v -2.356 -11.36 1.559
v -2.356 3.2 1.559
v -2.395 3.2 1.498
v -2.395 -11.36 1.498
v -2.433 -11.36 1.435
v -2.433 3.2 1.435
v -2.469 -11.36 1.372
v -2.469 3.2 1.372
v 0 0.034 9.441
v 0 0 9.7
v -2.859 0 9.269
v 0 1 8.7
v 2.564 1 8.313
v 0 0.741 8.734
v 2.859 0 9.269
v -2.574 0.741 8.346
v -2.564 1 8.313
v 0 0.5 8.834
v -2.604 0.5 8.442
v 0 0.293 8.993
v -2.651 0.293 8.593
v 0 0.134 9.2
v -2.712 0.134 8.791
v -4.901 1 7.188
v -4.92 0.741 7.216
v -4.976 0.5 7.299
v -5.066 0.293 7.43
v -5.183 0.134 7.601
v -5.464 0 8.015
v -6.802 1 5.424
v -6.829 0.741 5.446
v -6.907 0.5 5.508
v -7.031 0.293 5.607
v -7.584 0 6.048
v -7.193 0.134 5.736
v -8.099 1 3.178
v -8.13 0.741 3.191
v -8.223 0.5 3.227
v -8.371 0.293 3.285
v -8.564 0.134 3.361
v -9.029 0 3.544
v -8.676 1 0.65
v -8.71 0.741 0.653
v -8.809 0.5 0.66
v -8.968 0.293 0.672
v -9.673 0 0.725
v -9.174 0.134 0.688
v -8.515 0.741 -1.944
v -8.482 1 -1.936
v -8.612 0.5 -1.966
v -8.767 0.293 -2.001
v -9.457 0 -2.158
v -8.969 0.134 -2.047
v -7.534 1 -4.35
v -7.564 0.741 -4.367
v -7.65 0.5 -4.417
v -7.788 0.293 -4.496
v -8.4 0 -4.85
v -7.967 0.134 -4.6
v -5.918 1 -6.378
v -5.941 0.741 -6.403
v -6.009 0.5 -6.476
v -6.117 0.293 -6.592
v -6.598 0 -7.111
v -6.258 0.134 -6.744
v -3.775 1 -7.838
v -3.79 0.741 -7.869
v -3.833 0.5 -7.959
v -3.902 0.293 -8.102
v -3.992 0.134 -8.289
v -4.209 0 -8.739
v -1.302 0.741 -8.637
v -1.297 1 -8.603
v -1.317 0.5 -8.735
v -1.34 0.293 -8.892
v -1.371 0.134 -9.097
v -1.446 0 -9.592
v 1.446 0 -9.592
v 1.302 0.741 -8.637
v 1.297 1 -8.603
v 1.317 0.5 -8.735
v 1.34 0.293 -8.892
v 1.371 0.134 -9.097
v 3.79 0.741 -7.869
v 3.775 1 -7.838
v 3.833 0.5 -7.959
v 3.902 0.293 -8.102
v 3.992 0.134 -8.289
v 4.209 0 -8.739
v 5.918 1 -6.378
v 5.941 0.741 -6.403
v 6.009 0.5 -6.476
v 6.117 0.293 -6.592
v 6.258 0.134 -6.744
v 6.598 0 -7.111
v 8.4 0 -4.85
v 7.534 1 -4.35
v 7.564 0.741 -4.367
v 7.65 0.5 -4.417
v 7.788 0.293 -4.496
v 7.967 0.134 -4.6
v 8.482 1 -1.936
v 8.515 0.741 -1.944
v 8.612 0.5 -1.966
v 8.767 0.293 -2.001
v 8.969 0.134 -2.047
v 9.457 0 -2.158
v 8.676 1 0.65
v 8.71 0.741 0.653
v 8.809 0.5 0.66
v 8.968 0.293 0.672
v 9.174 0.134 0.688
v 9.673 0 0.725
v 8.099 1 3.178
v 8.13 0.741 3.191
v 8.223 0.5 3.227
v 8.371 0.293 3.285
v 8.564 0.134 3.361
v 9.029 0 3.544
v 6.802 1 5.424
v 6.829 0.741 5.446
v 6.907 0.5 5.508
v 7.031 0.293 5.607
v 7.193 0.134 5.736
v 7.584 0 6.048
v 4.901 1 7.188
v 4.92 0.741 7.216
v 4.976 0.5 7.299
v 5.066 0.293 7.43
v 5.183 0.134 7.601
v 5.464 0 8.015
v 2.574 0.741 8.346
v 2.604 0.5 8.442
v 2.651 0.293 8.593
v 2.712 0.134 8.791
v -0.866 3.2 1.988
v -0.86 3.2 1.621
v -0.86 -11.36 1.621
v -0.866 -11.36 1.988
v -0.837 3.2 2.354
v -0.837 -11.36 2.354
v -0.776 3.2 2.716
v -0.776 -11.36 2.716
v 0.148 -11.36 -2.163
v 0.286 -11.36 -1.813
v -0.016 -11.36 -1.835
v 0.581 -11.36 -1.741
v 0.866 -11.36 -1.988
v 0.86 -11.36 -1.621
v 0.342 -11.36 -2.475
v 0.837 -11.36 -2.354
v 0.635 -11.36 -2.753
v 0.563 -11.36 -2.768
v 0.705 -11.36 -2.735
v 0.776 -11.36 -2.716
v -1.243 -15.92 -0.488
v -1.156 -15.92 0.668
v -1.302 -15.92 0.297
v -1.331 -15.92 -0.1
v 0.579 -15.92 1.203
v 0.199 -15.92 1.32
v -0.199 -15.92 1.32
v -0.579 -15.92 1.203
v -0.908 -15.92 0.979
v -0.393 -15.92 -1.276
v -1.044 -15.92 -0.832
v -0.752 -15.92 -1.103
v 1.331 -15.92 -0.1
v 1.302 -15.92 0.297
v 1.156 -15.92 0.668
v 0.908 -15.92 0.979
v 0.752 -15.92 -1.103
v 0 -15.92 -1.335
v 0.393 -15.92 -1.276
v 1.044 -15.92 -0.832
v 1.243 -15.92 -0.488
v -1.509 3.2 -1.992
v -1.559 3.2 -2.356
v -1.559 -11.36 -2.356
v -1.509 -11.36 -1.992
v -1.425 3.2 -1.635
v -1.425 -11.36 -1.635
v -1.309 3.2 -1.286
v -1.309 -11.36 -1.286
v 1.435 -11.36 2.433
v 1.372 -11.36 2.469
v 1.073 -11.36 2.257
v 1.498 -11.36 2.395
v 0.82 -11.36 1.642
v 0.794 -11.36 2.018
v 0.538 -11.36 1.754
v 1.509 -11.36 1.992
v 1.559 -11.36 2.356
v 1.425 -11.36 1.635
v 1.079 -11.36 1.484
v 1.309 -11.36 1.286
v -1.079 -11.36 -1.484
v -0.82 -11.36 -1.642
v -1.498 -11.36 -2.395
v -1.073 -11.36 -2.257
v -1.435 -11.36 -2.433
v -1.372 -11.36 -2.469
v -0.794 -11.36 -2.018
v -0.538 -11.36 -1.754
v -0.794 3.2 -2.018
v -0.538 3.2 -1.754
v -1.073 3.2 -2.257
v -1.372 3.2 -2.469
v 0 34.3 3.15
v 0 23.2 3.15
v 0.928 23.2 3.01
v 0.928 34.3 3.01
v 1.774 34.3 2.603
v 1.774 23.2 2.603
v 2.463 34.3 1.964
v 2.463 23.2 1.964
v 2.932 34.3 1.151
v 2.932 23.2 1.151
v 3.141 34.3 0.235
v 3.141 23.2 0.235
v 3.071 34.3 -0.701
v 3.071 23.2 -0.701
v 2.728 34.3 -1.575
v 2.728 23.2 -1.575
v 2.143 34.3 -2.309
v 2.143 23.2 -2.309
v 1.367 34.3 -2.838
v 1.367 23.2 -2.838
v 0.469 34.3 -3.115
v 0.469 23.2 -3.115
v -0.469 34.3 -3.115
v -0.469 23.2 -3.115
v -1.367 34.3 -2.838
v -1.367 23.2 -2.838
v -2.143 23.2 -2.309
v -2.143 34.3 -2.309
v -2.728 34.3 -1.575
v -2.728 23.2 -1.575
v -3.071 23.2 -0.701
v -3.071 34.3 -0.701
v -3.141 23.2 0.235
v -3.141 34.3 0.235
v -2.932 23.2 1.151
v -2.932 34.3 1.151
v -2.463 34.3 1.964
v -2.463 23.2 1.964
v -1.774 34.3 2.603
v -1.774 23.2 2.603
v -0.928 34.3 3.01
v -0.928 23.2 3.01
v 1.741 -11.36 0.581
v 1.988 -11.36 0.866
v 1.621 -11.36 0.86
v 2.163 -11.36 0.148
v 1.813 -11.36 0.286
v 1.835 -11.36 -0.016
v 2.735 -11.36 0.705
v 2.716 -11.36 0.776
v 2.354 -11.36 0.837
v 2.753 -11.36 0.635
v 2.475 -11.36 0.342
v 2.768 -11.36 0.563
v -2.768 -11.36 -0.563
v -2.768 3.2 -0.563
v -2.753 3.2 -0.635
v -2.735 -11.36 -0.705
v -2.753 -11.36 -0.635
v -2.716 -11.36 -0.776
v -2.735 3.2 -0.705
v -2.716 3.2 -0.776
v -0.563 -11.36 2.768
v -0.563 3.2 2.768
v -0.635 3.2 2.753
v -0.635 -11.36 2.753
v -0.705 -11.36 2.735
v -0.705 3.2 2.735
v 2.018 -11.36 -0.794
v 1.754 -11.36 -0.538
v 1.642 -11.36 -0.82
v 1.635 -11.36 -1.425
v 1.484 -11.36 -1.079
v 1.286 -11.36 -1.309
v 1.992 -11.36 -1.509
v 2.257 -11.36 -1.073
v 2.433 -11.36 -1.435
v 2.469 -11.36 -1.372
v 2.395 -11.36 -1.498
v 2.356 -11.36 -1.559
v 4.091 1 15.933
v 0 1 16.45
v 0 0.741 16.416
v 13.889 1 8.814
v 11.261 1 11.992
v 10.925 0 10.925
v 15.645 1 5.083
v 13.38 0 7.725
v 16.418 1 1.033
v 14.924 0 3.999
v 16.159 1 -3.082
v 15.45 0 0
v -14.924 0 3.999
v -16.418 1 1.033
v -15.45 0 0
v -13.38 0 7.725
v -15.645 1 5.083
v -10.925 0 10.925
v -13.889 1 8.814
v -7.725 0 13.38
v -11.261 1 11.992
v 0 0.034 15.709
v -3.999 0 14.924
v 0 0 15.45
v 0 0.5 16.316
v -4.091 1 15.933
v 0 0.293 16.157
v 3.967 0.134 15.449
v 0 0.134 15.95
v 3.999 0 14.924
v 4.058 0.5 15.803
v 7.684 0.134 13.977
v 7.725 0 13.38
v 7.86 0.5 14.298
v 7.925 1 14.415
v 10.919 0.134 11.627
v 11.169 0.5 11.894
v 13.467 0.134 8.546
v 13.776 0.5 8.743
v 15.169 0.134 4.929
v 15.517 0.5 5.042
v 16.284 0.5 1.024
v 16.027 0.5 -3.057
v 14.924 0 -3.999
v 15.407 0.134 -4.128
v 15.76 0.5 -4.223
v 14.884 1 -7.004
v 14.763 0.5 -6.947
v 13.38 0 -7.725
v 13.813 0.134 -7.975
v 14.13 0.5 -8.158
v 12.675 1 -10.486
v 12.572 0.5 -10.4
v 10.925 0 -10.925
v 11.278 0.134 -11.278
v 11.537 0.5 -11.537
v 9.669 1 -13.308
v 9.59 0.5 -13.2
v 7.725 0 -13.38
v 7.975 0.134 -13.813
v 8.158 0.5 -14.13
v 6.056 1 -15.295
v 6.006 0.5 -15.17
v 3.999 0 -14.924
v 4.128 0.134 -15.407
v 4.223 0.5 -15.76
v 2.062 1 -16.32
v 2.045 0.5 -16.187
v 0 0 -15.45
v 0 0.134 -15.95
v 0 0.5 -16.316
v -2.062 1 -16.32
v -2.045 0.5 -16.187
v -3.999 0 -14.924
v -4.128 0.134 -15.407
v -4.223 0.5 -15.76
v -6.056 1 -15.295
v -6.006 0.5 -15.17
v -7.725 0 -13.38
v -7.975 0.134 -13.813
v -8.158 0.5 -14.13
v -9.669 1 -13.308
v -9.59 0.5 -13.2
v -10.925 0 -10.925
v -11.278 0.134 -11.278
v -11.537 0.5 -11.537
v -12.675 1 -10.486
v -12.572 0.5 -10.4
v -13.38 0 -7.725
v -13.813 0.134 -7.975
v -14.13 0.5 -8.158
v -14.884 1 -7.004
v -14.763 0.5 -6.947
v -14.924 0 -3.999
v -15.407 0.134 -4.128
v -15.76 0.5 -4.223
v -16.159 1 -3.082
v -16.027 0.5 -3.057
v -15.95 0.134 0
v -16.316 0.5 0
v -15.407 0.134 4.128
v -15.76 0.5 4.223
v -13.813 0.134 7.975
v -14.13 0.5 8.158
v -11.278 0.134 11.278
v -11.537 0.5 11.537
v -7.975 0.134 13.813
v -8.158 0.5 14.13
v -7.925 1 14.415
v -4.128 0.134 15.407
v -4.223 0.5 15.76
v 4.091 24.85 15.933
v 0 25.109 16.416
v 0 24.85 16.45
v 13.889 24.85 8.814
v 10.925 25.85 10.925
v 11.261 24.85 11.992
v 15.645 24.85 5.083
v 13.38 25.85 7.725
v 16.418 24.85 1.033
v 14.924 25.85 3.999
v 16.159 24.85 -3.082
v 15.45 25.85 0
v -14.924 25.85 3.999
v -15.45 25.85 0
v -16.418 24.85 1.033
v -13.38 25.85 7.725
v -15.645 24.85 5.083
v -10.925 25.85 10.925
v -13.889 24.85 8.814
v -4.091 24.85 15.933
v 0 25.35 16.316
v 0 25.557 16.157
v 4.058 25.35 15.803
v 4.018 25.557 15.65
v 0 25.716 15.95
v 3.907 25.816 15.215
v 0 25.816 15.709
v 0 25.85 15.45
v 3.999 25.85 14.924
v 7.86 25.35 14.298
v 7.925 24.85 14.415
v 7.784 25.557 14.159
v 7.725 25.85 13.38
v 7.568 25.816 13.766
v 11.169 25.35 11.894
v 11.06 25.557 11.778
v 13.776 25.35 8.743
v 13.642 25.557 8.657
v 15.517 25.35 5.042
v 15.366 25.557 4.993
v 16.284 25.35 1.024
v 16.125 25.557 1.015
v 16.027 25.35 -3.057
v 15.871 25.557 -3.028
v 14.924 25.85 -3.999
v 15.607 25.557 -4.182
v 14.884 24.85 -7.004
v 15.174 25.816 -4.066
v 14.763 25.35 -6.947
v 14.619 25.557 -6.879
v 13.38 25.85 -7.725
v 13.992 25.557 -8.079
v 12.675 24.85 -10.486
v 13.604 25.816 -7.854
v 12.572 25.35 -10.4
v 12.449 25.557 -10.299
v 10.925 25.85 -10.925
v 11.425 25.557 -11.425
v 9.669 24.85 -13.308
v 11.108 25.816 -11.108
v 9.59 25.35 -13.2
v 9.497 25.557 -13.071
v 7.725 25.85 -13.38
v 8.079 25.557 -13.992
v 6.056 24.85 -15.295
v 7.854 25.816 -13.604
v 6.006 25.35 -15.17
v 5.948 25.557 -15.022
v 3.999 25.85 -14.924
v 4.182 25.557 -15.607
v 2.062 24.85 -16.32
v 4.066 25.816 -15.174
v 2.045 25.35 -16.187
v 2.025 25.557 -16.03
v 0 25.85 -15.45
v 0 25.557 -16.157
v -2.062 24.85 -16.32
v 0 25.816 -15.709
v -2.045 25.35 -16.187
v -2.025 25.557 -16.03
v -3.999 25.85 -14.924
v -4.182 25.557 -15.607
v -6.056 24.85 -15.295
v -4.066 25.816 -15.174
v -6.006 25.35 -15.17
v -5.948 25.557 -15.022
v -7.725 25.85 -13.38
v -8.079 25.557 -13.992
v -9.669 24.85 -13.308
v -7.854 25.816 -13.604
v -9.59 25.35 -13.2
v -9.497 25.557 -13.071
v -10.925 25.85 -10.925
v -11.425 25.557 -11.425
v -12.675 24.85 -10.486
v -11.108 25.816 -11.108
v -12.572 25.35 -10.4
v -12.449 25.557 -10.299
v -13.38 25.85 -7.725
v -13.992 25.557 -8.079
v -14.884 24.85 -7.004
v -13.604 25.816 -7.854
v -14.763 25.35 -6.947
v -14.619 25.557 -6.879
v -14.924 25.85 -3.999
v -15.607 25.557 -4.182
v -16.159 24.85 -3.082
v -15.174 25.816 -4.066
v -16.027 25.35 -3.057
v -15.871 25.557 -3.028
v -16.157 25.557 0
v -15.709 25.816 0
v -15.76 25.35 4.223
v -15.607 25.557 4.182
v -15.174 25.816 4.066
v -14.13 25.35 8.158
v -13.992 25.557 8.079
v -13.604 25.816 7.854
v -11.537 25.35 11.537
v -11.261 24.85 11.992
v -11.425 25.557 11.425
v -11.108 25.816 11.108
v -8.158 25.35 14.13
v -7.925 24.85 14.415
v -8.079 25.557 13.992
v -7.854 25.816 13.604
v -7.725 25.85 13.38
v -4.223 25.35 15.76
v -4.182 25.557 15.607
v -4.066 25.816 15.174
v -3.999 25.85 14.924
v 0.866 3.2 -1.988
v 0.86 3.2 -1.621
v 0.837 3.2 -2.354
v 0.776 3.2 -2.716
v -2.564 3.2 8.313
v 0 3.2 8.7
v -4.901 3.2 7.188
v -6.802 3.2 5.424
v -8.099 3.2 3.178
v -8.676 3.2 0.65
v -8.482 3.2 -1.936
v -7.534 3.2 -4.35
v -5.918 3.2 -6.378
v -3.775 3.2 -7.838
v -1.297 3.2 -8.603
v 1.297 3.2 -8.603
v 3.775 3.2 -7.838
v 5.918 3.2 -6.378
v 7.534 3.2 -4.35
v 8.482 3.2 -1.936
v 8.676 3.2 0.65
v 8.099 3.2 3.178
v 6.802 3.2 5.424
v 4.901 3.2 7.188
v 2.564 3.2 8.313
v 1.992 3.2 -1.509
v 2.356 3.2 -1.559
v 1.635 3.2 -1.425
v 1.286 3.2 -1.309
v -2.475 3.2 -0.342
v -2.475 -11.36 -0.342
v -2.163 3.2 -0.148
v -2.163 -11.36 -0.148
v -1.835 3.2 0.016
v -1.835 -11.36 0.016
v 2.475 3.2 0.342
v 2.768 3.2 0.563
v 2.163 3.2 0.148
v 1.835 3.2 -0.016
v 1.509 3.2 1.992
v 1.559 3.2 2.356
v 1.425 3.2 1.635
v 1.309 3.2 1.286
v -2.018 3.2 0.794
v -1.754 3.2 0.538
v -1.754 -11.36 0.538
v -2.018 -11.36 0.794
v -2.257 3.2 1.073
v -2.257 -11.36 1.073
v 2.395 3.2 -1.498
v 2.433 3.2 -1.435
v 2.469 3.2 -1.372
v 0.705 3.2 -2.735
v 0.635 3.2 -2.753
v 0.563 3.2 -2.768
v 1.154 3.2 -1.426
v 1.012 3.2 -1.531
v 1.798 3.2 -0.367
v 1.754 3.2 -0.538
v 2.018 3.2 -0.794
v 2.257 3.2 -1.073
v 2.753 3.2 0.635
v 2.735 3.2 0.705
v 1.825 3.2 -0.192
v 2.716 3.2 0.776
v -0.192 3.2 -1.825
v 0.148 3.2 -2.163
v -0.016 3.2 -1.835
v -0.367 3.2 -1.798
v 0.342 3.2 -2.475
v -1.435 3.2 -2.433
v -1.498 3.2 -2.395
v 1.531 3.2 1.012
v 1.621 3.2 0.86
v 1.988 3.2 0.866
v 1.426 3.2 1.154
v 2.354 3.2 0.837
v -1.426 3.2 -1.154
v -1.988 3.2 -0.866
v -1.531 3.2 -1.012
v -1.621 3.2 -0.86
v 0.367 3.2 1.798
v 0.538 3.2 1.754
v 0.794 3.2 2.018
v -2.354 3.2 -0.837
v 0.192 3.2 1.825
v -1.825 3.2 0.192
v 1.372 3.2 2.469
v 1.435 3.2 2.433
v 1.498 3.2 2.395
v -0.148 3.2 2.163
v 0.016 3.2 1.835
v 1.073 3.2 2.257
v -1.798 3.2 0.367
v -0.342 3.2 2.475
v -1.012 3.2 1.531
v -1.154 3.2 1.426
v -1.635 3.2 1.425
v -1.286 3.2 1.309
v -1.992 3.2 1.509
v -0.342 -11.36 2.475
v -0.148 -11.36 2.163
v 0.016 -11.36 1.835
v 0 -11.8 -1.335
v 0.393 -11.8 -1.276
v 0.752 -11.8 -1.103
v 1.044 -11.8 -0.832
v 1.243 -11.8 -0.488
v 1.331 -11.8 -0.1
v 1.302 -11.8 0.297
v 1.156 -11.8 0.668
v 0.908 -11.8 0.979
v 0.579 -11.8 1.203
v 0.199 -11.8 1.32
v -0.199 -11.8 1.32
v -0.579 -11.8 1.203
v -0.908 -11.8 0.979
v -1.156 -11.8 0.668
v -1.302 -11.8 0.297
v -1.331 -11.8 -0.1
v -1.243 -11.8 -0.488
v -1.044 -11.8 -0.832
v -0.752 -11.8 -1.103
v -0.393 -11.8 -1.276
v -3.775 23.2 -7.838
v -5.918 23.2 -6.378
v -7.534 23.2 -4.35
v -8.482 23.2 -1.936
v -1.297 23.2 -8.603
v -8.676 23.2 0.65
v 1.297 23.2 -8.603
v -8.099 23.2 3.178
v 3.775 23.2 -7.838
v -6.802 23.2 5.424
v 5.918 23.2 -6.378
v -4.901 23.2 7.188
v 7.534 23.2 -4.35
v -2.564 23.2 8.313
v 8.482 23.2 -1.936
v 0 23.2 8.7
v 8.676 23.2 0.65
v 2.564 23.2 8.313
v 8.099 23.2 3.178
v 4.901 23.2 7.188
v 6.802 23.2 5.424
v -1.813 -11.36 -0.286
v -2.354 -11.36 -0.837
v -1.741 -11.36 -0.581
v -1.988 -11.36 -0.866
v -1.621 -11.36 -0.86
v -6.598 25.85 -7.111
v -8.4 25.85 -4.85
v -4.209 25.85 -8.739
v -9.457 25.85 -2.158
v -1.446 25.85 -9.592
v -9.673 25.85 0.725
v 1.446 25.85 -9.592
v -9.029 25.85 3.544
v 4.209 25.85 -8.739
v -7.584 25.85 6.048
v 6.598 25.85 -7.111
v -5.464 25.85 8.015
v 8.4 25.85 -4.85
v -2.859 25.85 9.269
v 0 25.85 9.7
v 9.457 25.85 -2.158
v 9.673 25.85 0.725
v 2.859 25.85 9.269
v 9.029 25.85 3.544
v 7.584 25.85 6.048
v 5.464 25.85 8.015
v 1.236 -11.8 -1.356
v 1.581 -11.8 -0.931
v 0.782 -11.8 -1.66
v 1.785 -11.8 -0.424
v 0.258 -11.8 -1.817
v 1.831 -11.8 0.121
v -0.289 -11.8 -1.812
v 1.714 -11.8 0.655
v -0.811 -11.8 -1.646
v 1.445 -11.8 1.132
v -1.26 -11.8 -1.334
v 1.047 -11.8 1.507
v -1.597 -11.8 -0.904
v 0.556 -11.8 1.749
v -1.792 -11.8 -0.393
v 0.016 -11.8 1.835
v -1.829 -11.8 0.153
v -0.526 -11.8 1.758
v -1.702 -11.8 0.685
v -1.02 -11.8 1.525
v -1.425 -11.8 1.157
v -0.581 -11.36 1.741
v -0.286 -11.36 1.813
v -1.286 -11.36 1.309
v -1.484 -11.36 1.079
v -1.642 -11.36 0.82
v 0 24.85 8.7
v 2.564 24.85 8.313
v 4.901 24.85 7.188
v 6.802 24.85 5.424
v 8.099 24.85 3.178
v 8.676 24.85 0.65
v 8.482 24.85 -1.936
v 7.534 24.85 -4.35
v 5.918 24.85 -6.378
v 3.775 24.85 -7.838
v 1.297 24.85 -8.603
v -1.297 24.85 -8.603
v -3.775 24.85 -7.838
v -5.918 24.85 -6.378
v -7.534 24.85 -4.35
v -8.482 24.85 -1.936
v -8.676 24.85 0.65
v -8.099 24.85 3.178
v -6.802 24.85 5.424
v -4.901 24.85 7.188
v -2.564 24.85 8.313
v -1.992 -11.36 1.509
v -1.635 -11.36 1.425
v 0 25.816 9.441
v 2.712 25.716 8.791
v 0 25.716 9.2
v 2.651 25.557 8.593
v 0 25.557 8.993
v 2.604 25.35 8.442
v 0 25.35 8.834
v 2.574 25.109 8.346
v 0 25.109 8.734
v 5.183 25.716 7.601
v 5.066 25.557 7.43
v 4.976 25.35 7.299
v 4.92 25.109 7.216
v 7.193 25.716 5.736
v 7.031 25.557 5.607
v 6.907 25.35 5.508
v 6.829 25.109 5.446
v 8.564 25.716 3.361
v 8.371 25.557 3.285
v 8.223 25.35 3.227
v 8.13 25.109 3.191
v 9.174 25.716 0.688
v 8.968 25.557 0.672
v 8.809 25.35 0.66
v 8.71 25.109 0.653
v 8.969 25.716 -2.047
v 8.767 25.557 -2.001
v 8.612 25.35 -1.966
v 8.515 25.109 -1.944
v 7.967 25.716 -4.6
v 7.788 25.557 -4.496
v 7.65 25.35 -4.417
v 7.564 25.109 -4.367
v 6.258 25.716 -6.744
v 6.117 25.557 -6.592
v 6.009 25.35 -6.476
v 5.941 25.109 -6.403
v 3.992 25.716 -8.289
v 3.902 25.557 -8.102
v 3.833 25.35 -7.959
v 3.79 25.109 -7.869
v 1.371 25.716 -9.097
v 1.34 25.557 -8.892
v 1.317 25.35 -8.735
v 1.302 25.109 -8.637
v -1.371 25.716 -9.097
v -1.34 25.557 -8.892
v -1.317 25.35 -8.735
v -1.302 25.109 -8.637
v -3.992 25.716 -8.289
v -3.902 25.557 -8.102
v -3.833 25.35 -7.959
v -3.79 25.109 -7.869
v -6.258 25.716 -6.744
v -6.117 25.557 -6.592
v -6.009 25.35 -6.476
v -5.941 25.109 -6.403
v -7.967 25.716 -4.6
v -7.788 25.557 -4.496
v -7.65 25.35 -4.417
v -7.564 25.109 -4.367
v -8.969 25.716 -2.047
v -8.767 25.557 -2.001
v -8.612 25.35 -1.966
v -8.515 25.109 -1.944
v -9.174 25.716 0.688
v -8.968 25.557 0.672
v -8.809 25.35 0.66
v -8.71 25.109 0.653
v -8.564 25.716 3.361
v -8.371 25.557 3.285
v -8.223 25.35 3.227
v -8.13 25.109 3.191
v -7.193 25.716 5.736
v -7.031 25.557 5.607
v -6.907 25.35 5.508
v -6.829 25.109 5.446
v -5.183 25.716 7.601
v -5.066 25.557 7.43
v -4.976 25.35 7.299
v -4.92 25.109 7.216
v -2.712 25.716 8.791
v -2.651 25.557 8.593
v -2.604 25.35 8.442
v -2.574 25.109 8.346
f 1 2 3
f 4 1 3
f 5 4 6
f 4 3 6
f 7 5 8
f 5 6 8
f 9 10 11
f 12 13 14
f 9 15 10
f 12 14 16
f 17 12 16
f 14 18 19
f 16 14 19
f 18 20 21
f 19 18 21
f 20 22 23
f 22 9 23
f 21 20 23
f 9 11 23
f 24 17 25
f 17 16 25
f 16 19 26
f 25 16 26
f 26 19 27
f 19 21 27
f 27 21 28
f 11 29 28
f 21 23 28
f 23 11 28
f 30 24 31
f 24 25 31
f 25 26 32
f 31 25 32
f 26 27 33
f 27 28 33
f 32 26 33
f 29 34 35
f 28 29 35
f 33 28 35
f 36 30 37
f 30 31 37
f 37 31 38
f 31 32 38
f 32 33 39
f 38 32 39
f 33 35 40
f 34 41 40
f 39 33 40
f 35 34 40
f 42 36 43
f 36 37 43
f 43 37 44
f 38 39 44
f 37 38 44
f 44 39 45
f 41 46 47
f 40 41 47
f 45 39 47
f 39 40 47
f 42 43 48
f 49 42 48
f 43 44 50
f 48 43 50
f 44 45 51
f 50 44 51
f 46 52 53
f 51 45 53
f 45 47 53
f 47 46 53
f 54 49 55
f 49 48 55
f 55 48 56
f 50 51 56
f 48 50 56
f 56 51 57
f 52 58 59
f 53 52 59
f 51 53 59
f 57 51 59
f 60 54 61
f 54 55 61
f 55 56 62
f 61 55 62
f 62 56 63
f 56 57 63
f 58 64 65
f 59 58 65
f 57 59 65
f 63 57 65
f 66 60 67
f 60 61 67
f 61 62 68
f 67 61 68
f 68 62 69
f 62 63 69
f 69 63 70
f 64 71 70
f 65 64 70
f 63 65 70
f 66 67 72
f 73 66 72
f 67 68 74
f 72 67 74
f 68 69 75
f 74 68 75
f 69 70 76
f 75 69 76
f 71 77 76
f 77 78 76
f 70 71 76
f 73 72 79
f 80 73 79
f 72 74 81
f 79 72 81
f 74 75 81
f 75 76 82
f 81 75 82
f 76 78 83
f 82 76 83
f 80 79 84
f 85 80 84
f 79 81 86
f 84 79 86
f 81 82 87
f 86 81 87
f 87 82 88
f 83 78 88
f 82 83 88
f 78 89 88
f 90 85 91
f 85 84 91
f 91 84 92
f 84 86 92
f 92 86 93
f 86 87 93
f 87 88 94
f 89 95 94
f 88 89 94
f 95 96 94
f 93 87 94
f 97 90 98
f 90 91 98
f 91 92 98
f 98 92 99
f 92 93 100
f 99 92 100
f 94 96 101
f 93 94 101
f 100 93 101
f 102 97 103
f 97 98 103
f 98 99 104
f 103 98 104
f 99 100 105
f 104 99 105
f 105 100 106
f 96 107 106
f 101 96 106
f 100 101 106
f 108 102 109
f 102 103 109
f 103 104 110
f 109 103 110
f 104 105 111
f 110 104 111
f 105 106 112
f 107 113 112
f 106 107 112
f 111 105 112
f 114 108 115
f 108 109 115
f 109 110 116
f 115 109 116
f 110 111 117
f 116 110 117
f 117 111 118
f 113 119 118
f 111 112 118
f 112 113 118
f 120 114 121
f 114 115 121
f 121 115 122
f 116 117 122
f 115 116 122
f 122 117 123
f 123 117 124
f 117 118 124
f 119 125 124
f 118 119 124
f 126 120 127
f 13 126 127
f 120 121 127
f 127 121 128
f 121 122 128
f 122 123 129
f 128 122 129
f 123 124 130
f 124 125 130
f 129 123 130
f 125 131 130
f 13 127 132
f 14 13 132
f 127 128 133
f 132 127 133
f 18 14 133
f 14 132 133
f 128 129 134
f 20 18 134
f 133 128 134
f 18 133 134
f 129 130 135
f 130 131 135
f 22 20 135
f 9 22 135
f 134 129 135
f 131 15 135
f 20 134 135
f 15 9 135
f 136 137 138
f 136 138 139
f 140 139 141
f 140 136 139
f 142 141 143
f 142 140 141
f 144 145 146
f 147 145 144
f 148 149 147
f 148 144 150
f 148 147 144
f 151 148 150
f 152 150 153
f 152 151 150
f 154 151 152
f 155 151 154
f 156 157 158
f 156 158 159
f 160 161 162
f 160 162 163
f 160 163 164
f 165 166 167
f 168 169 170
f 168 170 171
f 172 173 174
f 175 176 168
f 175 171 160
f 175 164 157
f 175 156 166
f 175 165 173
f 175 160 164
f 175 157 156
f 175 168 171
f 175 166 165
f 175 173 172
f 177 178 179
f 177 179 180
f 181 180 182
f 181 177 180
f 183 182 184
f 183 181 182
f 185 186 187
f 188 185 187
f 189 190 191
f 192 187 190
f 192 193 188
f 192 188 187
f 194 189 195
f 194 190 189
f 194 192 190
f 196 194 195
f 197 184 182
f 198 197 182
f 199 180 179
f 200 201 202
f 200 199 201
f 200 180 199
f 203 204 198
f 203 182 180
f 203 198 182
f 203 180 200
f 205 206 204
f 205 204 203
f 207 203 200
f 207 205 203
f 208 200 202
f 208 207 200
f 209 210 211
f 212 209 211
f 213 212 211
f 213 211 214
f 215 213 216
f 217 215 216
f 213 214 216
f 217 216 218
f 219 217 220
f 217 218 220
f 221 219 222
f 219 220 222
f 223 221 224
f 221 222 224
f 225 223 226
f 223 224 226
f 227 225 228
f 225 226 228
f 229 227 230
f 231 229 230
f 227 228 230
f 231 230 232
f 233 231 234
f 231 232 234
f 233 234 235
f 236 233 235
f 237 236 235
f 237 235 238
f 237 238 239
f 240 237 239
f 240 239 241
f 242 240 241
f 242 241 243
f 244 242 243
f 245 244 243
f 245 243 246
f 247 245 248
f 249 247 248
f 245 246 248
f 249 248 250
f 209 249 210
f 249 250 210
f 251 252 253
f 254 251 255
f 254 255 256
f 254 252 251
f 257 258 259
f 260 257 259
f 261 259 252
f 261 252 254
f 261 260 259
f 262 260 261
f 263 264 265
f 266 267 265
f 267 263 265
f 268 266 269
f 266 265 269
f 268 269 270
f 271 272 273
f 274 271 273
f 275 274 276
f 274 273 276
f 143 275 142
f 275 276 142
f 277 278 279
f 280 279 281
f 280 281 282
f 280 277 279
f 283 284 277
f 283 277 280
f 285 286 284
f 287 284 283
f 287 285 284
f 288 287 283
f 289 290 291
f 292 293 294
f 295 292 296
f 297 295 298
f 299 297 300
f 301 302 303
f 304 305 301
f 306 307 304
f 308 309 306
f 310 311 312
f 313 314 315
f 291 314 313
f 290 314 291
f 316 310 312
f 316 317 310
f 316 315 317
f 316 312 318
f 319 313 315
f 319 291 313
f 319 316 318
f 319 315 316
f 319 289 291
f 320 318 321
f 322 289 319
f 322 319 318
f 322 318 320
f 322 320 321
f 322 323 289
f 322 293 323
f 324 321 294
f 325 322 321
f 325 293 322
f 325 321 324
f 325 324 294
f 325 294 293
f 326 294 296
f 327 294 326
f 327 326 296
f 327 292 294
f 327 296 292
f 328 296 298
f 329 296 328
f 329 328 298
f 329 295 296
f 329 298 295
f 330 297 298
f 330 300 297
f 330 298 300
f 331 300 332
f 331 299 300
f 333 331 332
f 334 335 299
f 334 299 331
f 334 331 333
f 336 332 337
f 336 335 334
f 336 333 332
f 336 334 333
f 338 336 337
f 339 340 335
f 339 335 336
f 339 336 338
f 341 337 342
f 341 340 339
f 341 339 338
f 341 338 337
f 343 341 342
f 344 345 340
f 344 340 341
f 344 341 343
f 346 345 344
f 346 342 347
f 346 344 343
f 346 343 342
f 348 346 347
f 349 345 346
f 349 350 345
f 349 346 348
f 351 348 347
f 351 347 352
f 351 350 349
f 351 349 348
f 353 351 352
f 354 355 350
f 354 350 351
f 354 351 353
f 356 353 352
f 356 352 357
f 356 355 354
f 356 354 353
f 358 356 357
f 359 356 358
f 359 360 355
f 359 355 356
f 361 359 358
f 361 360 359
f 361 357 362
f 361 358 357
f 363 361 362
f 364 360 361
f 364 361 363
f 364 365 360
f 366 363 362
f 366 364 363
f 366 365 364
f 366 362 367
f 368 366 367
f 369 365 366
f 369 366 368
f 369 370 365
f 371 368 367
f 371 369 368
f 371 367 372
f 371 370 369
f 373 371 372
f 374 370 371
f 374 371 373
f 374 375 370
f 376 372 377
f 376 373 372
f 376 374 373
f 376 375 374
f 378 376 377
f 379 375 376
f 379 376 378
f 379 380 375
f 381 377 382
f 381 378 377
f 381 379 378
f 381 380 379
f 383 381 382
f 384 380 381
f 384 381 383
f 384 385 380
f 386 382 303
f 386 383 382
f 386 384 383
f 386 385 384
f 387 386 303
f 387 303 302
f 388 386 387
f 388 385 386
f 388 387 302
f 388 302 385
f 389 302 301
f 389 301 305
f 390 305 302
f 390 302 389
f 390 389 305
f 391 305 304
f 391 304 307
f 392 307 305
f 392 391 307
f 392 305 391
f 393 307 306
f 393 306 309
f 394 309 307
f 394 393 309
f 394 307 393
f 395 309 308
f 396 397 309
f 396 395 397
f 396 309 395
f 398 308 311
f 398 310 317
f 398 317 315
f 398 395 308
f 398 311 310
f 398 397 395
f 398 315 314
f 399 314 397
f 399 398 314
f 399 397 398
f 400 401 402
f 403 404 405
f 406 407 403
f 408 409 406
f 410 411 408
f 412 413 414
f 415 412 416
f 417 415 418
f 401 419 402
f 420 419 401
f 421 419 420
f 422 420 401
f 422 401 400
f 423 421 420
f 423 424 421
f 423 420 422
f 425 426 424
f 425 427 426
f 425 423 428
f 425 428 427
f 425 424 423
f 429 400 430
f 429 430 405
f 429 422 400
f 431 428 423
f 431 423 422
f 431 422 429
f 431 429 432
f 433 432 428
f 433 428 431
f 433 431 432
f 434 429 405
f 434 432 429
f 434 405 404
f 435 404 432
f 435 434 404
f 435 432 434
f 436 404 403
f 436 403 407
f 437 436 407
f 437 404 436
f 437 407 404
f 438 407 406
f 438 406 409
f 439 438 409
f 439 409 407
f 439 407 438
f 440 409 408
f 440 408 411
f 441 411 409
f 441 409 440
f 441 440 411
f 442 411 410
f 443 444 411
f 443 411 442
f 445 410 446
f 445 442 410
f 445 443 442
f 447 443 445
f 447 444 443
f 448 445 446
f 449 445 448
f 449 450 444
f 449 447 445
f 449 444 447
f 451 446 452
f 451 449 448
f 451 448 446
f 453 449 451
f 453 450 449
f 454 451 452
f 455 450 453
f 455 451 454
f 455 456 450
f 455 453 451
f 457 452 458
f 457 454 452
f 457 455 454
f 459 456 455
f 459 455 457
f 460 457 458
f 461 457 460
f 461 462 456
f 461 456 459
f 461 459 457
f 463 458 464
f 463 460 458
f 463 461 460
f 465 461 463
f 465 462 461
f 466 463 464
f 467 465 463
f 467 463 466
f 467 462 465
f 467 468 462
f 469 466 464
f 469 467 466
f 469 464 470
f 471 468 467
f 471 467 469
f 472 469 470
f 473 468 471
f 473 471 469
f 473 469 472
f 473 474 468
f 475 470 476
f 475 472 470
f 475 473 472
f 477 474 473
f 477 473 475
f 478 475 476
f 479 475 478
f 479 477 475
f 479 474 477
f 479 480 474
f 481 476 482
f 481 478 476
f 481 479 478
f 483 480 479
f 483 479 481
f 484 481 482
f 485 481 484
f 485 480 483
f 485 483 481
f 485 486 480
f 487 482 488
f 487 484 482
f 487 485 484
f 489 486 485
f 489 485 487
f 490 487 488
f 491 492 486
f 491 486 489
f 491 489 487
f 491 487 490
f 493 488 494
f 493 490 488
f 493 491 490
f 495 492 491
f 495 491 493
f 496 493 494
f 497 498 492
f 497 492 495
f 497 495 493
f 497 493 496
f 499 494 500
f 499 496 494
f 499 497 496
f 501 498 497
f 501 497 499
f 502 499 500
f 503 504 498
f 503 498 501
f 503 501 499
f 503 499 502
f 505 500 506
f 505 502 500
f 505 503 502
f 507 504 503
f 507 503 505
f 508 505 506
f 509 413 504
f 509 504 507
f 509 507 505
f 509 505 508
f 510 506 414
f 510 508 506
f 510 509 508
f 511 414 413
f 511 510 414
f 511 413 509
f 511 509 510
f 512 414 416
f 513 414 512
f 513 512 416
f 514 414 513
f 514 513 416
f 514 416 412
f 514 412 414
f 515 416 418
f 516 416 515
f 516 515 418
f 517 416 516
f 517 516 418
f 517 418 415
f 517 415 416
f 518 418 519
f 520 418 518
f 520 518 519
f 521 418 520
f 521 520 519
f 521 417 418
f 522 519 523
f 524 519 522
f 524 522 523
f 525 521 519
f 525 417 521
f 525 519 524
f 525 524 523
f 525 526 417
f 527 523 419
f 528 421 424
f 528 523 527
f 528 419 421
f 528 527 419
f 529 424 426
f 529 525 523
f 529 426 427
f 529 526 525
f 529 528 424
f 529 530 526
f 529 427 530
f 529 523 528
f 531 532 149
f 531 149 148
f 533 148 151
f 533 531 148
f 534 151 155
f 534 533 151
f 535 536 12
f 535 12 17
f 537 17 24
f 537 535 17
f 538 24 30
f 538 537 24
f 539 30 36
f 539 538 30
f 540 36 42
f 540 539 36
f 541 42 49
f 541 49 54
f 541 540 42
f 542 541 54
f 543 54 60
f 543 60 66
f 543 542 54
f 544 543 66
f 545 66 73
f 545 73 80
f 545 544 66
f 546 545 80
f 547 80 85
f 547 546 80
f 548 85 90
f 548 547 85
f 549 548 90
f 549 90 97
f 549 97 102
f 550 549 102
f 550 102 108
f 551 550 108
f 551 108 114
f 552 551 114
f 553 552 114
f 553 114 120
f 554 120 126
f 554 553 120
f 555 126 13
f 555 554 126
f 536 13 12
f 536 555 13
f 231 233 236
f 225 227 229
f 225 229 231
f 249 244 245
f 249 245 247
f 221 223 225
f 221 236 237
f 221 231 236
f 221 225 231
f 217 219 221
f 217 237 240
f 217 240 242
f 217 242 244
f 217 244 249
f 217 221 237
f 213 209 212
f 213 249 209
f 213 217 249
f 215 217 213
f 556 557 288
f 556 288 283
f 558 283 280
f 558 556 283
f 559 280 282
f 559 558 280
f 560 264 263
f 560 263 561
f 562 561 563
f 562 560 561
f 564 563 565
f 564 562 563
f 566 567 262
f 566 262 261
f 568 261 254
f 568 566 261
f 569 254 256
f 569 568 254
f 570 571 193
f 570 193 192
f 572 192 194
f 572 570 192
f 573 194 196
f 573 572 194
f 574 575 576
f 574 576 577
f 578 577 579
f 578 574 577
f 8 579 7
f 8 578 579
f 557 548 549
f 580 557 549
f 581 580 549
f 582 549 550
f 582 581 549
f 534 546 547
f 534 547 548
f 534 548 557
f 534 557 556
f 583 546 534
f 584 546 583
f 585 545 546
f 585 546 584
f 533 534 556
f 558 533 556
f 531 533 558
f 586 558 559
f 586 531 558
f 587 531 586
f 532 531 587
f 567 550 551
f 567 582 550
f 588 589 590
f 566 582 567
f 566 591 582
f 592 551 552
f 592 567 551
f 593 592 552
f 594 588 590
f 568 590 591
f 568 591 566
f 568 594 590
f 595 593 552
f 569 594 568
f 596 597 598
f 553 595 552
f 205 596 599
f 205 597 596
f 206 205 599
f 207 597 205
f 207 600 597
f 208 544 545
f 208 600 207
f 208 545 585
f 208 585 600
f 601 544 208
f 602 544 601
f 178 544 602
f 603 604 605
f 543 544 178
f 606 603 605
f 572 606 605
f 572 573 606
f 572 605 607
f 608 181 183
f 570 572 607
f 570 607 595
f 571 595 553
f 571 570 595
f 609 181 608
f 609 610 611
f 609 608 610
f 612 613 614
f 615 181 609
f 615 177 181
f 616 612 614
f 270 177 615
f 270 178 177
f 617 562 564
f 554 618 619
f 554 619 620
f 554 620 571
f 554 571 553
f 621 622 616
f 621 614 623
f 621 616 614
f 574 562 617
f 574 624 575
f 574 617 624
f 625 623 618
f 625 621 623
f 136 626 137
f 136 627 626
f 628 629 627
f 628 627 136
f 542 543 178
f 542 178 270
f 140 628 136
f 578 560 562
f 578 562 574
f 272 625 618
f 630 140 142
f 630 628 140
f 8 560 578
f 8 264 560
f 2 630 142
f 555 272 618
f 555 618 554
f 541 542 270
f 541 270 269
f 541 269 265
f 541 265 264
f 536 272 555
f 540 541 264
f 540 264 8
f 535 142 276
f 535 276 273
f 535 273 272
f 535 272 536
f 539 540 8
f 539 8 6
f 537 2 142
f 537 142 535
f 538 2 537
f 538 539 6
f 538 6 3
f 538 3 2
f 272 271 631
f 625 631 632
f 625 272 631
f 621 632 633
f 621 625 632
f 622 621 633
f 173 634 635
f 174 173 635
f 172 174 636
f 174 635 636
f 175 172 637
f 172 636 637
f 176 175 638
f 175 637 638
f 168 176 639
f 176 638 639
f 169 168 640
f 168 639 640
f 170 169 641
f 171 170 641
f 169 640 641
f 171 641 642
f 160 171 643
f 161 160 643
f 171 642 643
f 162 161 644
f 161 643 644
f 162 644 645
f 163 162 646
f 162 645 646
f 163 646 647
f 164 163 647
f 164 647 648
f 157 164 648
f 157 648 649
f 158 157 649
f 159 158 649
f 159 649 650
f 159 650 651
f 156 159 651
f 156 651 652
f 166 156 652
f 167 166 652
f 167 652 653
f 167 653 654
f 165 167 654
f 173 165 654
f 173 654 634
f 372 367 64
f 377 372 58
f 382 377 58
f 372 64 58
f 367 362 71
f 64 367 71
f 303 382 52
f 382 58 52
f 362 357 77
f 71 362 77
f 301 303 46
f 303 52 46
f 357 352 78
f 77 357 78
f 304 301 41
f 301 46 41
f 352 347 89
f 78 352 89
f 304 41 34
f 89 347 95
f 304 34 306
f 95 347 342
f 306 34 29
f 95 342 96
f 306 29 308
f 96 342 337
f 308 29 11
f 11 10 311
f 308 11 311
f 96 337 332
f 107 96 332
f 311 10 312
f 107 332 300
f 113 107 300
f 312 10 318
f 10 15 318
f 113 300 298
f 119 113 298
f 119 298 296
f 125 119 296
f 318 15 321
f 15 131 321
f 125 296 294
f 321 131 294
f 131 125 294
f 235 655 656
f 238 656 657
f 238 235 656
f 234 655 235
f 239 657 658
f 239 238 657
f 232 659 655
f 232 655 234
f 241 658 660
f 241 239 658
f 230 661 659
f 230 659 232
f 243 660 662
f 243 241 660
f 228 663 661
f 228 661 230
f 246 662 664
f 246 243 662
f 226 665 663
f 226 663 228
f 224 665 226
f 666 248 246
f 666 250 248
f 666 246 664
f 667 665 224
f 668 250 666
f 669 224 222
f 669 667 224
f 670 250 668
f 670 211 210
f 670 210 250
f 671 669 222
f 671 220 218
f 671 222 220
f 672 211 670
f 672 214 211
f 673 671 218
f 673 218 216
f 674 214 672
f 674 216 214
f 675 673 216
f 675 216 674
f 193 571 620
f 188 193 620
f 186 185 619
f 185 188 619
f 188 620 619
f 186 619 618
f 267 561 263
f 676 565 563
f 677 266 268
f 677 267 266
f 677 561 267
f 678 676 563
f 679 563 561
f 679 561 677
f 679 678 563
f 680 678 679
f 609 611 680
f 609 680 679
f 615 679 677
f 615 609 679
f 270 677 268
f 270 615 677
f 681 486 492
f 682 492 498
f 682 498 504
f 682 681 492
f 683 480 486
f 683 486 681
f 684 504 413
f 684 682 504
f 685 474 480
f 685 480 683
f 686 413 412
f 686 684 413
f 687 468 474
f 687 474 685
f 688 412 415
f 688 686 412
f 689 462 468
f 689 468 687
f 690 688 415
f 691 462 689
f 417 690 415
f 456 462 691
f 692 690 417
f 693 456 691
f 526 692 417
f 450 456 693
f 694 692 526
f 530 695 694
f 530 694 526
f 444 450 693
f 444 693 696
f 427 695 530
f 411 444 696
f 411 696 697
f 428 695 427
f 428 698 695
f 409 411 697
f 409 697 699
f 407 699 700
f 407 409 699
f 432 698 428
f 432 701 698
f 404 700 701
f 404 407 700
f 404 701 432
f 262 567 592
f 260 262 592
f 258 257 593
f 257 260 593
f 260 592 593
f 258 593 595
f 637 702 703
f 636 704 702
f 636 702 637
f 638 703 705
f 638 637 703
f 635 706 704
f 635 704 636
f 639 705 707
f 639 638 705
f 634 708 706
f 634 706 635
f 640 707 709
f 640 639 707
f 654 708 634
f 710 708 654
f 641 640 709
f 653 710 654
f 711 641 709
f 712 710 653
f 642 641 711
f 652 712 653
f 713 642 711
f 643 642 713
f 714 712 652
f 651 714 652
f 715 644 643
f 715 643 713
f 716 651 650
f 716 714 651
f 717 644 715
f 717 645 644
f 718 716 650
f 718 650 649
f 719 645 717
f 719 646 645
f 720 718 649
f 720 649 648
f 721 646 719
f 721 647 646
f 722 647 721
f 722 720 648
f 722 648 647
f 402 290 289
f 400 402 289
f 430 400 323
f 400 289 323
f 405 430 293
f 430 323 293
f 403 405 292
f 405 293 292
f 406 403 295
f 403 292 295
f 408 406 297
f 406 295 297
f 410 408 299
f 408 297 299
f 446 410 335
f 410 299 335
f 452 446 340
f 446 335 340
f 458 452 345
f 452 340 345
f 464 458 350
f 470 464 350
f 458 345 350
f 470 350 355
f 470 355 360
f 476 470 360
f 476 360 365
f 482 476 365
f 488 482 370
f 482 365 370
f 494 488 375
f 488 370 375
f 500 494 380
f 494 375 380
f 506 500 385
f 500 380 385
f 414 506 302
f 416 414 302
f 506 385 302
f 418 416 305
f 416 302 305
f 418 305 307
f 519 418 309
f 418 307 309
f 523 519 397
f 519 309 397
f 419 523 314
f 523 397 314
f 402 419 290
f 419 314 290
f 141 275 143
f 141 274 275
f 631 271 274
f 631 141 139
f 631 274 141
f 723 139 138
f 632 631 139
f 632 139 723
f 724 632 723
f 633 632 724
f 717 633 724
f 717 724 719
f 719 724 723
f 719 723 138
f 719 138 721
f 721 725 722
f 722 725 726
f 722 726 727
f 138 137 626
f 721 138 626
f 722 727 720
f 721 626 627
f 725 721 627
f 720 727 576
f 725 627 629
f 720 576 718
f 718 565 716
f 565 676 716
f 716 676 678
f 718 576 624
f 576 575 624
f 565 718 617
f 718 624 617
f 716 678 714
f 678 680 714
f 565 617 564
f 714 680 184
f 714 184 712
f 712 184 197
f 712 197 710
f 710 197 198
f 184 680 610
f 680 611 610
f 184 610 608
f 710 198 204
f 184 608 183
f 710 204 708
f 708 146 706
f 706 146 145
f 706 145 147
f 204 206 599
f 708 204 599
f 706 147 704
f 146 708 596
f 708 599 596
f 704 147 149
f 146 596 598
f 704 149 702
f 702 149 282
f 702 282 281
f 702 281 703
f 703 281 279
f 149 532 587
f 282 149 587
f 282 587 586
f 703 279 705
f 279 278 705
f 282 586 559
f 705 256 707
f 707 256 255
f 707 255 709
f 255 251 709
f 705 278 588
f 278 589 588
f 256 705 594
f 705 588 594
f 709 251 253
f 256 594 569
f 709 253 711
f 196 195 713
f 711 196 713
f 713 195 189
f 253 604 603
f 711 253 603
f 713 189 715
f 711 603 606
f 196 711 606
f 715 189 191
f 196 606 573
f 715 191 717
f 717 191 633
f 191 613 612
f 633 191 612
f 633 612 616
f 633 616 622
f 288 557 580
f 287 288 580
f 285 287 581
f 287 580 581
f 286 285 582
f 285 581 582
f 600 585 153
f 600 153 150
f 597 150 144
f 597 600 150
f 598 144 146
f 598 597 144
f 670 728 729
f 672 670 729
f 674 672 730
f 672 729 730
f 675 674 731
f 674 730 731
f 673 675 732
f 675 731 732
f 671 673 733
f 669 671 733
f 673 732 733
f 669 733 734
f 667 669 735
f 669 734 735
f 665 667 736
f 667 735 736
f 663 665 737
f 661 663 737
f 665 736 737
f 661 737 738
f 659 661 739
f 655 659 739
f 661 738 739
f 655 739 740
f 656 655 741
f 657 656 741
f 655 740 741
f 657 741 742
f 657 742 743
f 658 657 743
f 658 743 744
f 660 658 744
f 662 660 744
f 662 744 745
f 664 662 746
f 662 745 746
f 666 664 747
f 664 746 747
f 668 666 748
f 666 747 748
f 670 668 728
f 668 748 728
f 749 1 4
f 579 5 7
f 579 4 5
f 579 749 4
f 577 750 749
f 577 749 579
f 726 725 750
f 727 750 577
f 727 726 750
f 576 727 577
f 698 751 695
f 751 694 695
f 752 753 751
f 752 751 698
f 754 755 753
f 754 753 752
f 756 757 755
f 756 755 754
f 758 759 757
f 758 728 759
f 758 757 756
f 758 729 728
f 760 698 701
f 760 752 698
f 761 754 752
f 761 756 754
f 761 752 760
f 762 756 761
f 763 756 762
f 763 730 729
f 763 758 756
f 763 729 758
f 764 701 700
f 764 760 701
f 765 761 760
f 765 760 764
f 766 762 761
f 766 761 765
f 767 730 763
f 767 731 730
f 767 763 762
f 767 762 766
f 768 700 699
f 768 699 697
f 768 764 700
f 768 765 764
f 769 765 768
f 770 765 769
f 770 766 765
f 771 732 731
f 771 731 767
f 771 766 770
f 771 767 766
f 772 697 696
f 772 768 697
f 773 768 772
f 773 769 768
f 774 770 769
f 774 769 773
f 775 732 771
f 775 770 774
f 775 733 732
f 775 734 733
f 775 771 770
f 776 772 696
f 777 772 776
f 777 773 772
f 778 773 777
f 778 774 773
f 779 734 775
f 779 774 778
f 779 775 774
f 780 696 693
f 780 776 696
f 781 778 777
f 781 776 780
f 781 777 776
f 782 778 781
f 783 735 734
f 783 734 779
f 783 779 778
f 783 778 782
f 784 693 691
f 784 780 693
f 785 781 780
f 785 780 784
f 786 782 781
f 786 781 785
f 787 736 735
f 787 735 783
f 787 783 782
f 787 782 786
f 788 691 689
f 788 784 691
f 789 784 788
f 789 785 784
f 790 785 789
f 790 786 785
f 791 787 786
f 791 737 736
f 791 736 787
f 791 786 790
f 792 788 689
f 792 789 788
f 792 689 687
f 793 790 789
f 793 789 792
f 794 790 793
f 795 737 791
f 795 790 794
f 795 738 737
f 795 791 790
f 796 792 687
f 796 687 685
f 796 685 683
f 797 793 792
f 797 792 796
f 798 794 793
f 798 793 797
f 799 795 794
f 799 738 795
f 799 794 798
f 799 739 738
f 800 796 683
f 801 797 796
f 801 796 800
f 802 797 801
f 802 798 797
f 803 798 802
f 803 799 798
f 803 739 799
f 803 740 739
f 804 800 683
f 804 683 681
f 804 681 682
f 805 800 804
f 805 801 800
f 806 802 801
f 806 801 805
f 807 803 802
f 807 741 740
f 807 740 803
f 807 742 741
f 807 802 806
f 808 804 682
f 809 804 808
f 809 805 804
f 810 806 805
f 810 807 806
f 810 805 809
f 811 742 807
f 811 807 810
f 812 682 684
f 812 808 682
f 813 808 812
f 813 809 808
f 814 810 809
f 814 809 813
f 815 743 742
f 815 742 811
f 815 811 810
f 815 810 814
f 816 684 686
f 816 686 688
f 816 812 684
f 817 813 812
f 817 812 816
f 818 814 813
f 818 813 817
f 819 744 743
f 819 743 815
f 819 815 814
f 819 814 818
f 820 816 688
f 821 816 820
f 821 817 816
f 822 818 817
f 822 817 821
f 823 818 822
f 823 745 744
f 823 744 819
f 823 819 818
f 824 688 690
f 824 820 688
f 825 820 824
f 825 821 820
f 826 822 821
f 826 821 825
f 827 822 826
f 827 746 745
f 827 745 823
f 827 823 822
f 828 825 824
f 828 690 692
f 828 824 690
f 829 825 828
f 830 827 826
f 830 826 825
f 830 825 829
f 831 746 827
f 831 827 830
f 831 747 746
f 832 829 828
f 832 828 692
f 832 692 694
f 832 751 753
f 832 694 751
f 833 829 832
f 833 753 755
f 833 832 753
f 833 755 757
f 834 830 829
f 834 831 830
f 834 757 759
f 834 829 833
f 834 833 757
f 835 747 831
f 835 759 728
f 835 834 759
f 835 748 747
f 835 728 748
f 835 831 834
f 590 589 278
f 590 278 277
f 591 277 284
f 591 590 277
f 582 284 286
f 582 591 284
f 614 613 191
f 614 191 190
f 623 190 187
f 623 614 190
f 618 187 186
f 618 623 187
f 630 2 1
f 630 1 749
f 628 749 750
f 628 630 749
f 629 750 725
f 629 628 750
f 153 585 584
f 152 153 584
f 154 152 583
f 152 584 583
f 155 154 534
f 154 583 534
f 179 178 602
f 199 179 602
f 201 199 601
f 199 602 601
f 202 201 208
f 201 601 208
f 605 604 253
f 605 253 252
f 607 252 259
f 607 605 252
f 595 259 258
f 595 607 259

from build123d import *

# Parameters (mm, degrees)
SKETCH1_R           = 16.45
BOSS_EXTRUDE1_DEPTH = 25.85
SKETCH2_R           = 8.7
CUT_EXTRUDE1_DEPTH  = 2.65
SKETCH3_R           = 3.15
BOSS_EXTRUDE2_DEPTH = 11.1
CUT_EXTRUDE2_START  = -3.2
SKETCH4_R           = 8.7
CUT_EXTRUDE2_DEPTH  = 3.2
SKETCH5_R           = 1.335
BOSS_EXTRUDE3_DEPTH = 19.12
SKETCH6_R           = 2.825
BOSS_EXTRUDE4_DEPTH = 14.56
FILLET1_R           = 1
CUT_EXTRUDE9_START  = -14.56
CUT_EXTRUDE9_DEPTH  = 14.56
CIRPATTERN3_COUNT   = 8
SKETCH16_R          = 1.835
BOSS_EXTRUDE6_DEPTH = 15


with BuildPart() as part:
    # Sketch1 → Boss-Extrude1 (new body)
    with BuildSketch(Plane(origin=(0, 0, 0), x_dir=(1, 0, 0), z_dir=(0, 1, 0))):
        with Locations(Location((0, 0, 0), (0, 0, 270))):
            Circle(SKETCH1_R)
    extrude(amount=BOSS_EXTRUDE1_DEPTH)

    # Sketch2 → Cut-Extrude1 (cut)
    with BuildSketch(Plane(origin=(0, 25.85, 0), x_dir=(1, 0, 0), z_dir=(0, 1, 0))):
        with Locations(Location((0, 0, 0), (0, 0, 270))):
            Circle(SKETCH2_R)
    extrude(amount=-CUT_EXTRUDE1_DEPTH, mode=Mode.SUBTRACT)

    # Sketch3 → Boss-Extrude2 (add)
    with BuildSketch(Plane(origin=(0, 23.2, 0), x_dir=(1, 0, 0), z_dir=(0, 1, 0))):
        with Locations(Location((0, 0, 0), (0, 0, 270))):
            Circle(SKETCH3_R)
    extrude(amount=BOSS_EXTRUDE2_DEPTH)

    # Sketch4 → Cut-Extrude2 (cut)
    with BuildSketch(Plane.XZ.offset(CUT_EXTRUDE2_START)):
        with Locations(Location((0, 0, 0), (0, 0, 90))):
            Circle(SKETCH4_R)
    extrude(amount=CUT_EXTRUDE2_DEPTH, mode=Mode.SUBTRACT)

    # Sketch5 → Boss-Extrude3 (add)
    with BuildSketch(Plane.XZ.offset(-3.2)):
        with Locations(Location((0, 0, 0), (0, 0, 270))):
            Circle(SKETCH5_R)
    extrude(amount=BOSS_EXTRUDE3_DEPTH)

    # Sketch6 → Boss-Extrude4 (add)
    with BuildSketch(Plane.XZ.offset(-3.2)):
        with Locations(Location((0, 0, 0), (0, 0, 270))):
            Circle(SKETCH6_R)
    extrude(amount=BOSS_EXTRUDE4_DEPTH)

    # Fillet1
    fillet1_edges = [part.edges().sort_by_distance(p)[0] for p in [
        (0, 0, -8.7),
        (0, 0, -16.45),
        (0, 25.85, -16.45),
        (0, 25.85, -8.7),
    ]]
    fillet(fillet1_edges, radius=FILLET1_R)

    # Sketch15 → Cut-Extrude9 (cut)
    with BuildSketch(Plane.XZ.offset(11.36).offset(CUT_EXTRUDE9_START)):
        with BuildLine():
            ThreePointArc((1.372148642, 2.469379093), (0.431099526, 2.791913), (-0.563406151, 2.768248275))
            ThreePointArc((-0.563406151, 2.768248275), (-0.104815557, 2.083529636), (0.203723139, 1.319364196))
            ThreePointArc((0.203723139, 1.319364196), (0.728385952, 1.954874919), (1.372148642, 2.469379093))
        make_face()
    cut_extrude9 = extrude(amount=CUT_EXTRUDE9_DEPTH, mode=Mode.SUBTRACT)

    # CirPattern3: Cut-Extrude9 ×8 about axis
    cirpattern3_axis = Axis((0, 0, 0), (0, 1, 0))
    for i in range(1, CIRPATTERN3_COUNT):
        add(cut_extrude9.rotate(cirpattern3_axis, i * 360 / CIRPATTERN3_COUNT), mode=Mode.SUBTRACT)

    # Sketch16 → Boss-Extrude6 (add)
    with BuildSketch(Plane.XZ.offset(-3.2)):
        with Locations(Location((0, 0, 0), (0, 0, 89.500330008))):
            Circle(SKETCH16_R)
    extrude(amount=BOSS_EXTRUDE6_DEPTH)


solid = part.part
